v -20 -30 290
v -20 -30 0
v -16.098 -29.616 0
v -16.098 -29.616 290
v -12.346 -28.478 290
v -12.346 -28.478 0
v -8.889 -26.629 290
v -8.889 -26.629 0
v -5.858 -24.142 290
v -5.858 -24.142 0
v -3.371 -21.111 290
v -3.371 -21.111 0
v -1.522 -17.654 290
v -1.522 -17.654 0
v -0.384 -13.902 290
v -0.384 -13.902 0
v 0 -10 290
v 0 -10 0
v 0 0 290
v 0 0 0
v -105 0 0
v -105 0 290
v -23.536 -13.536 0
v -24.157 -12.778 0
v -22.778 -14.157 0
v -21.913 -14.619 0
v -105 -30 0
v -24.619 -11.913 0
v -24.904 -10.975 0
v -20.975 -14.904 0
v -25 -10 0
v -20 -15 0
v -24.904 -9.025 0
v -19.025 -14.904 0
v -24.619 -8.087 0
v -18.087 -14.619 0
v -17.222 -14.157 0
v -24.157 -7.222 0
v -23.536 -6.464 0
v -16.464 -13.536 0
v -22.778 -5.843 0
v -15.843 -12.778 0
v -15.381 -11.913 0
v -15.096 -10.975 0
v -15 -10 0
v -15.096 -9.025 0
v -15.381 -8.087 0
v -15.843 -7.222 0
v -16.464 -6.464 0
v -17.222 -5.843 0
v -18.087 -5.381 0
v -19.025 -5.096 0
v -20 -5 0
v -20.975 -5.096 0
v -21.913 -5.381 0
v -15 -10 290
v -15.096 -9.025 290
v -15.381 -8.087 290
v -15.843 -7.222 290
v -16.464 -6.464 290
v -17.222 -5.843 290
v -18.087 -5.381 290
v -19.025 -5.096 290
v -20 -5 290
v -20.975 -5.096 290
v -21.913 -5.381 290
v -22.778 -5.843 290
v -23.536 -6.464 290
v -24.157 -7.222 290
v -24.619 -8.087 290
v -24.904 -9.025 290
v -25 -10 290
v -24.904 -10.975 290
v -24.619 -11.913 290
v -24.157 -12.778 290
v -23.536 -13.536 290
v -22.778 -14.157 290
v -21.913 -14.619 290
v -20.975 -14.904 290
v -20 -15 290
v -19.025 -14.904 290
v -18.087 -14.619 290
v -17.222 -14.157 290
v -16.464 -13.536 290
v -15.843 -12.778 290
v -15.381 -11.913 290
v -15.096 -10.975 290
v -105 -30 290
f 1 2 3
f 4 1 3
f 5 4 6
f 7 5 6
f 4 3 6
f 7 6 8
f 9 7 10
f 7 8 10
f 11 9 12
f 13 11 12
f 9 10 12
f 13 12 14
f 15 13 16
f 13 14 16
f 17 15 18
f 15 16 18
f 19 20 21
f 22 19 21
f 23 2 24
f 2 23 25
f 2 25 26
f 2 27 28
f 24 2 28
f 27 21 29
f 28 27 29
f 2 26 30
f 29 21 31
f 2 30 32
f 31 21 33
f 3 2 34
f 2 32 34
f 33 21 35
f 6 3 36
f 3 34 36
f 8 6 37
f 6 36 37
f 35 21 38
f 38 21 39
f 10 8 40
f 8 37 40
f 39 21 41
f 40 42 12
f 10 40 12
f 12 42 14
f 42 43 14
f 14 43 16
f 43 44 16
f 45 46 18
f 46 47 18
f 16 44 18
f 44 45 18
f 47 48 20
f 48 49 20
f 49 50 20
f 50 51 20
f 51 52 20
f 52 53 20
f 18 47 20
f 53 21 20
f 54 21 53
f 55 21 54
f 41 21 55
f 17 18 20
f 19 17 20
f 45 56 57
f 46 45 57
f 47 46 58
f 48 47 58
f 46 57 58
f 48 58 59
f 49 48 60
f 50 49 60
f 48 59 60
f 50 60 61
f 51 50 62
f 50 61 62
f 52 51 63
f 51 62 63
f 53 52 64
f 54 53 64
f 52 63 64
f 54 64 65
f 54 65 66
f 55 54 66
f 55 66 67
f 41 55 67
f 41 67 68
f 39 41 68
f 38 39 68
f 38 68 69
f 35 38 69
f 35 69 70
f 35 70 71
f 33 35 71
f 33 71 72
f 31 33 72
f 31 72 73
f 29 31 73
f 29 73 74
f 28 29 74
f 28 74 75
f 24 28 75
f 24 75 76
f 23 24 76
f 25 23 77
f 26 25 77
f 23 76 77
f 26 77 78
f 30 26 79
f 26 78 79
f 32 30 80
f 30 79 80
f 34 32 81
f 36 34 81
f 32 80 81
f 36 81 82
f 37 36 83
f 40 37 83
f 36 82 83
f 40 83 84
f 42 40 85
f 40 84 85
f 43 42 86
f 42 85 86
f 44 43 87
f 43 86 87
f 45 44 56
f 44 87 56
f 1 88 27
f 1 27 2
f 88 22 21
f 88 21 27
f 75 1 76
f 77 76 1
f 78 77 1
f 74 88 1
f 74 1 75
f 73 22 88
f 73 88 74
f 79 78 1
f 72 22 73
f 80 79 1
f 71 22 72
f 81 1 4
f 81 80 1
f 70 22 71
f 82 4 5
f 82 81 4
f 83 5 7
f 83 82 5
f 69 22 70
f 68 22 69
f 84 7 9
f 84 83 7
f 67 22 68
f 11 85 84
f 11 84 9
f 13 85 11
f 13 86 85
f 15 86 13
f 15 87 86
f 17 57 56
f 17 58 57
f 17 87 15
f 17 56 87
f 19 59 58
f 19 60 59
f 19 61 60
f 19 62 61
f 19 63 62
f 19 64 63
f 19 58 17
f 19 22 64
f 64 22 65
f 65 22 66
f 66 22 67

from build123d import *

# Parameters (mm, degrees)
EXTRUDE_1_DEPTH     = 290
SKETCH_2_R          = 5
CUT_EXTRUDE_1_DEPTH = 291


with BuildPart() as part:
    # 草图1 → 凸台-拉伸1 (new body)
    with BuildSketch(Plane.XY):
        with BuildLine():
            Line((0, 0), (-105, 0))
            Line((-105, 0), (-105, -30))
            Line((-105, -30), (-20, -30))
            ThreePointArc((-20, -30), (-5.857864376, -24.142135624), (0, -10))
            Line((0, -10), (0, 0))
        make_face()
    extrude(amount=EXTRUDE_1_DEPTH)

    # 草图2 → 切除-拉伸1 (cut, through all)
    with BuildSketch(Plane.XY.offset(290)):
        with Locations((-20, -10)):
            Circle(SKETCH_2_R)
    extrude(amount=-CUT_EXTRUDE_1_DEPTH, mode=Mode.SUBTRACT)


solid = part.part
